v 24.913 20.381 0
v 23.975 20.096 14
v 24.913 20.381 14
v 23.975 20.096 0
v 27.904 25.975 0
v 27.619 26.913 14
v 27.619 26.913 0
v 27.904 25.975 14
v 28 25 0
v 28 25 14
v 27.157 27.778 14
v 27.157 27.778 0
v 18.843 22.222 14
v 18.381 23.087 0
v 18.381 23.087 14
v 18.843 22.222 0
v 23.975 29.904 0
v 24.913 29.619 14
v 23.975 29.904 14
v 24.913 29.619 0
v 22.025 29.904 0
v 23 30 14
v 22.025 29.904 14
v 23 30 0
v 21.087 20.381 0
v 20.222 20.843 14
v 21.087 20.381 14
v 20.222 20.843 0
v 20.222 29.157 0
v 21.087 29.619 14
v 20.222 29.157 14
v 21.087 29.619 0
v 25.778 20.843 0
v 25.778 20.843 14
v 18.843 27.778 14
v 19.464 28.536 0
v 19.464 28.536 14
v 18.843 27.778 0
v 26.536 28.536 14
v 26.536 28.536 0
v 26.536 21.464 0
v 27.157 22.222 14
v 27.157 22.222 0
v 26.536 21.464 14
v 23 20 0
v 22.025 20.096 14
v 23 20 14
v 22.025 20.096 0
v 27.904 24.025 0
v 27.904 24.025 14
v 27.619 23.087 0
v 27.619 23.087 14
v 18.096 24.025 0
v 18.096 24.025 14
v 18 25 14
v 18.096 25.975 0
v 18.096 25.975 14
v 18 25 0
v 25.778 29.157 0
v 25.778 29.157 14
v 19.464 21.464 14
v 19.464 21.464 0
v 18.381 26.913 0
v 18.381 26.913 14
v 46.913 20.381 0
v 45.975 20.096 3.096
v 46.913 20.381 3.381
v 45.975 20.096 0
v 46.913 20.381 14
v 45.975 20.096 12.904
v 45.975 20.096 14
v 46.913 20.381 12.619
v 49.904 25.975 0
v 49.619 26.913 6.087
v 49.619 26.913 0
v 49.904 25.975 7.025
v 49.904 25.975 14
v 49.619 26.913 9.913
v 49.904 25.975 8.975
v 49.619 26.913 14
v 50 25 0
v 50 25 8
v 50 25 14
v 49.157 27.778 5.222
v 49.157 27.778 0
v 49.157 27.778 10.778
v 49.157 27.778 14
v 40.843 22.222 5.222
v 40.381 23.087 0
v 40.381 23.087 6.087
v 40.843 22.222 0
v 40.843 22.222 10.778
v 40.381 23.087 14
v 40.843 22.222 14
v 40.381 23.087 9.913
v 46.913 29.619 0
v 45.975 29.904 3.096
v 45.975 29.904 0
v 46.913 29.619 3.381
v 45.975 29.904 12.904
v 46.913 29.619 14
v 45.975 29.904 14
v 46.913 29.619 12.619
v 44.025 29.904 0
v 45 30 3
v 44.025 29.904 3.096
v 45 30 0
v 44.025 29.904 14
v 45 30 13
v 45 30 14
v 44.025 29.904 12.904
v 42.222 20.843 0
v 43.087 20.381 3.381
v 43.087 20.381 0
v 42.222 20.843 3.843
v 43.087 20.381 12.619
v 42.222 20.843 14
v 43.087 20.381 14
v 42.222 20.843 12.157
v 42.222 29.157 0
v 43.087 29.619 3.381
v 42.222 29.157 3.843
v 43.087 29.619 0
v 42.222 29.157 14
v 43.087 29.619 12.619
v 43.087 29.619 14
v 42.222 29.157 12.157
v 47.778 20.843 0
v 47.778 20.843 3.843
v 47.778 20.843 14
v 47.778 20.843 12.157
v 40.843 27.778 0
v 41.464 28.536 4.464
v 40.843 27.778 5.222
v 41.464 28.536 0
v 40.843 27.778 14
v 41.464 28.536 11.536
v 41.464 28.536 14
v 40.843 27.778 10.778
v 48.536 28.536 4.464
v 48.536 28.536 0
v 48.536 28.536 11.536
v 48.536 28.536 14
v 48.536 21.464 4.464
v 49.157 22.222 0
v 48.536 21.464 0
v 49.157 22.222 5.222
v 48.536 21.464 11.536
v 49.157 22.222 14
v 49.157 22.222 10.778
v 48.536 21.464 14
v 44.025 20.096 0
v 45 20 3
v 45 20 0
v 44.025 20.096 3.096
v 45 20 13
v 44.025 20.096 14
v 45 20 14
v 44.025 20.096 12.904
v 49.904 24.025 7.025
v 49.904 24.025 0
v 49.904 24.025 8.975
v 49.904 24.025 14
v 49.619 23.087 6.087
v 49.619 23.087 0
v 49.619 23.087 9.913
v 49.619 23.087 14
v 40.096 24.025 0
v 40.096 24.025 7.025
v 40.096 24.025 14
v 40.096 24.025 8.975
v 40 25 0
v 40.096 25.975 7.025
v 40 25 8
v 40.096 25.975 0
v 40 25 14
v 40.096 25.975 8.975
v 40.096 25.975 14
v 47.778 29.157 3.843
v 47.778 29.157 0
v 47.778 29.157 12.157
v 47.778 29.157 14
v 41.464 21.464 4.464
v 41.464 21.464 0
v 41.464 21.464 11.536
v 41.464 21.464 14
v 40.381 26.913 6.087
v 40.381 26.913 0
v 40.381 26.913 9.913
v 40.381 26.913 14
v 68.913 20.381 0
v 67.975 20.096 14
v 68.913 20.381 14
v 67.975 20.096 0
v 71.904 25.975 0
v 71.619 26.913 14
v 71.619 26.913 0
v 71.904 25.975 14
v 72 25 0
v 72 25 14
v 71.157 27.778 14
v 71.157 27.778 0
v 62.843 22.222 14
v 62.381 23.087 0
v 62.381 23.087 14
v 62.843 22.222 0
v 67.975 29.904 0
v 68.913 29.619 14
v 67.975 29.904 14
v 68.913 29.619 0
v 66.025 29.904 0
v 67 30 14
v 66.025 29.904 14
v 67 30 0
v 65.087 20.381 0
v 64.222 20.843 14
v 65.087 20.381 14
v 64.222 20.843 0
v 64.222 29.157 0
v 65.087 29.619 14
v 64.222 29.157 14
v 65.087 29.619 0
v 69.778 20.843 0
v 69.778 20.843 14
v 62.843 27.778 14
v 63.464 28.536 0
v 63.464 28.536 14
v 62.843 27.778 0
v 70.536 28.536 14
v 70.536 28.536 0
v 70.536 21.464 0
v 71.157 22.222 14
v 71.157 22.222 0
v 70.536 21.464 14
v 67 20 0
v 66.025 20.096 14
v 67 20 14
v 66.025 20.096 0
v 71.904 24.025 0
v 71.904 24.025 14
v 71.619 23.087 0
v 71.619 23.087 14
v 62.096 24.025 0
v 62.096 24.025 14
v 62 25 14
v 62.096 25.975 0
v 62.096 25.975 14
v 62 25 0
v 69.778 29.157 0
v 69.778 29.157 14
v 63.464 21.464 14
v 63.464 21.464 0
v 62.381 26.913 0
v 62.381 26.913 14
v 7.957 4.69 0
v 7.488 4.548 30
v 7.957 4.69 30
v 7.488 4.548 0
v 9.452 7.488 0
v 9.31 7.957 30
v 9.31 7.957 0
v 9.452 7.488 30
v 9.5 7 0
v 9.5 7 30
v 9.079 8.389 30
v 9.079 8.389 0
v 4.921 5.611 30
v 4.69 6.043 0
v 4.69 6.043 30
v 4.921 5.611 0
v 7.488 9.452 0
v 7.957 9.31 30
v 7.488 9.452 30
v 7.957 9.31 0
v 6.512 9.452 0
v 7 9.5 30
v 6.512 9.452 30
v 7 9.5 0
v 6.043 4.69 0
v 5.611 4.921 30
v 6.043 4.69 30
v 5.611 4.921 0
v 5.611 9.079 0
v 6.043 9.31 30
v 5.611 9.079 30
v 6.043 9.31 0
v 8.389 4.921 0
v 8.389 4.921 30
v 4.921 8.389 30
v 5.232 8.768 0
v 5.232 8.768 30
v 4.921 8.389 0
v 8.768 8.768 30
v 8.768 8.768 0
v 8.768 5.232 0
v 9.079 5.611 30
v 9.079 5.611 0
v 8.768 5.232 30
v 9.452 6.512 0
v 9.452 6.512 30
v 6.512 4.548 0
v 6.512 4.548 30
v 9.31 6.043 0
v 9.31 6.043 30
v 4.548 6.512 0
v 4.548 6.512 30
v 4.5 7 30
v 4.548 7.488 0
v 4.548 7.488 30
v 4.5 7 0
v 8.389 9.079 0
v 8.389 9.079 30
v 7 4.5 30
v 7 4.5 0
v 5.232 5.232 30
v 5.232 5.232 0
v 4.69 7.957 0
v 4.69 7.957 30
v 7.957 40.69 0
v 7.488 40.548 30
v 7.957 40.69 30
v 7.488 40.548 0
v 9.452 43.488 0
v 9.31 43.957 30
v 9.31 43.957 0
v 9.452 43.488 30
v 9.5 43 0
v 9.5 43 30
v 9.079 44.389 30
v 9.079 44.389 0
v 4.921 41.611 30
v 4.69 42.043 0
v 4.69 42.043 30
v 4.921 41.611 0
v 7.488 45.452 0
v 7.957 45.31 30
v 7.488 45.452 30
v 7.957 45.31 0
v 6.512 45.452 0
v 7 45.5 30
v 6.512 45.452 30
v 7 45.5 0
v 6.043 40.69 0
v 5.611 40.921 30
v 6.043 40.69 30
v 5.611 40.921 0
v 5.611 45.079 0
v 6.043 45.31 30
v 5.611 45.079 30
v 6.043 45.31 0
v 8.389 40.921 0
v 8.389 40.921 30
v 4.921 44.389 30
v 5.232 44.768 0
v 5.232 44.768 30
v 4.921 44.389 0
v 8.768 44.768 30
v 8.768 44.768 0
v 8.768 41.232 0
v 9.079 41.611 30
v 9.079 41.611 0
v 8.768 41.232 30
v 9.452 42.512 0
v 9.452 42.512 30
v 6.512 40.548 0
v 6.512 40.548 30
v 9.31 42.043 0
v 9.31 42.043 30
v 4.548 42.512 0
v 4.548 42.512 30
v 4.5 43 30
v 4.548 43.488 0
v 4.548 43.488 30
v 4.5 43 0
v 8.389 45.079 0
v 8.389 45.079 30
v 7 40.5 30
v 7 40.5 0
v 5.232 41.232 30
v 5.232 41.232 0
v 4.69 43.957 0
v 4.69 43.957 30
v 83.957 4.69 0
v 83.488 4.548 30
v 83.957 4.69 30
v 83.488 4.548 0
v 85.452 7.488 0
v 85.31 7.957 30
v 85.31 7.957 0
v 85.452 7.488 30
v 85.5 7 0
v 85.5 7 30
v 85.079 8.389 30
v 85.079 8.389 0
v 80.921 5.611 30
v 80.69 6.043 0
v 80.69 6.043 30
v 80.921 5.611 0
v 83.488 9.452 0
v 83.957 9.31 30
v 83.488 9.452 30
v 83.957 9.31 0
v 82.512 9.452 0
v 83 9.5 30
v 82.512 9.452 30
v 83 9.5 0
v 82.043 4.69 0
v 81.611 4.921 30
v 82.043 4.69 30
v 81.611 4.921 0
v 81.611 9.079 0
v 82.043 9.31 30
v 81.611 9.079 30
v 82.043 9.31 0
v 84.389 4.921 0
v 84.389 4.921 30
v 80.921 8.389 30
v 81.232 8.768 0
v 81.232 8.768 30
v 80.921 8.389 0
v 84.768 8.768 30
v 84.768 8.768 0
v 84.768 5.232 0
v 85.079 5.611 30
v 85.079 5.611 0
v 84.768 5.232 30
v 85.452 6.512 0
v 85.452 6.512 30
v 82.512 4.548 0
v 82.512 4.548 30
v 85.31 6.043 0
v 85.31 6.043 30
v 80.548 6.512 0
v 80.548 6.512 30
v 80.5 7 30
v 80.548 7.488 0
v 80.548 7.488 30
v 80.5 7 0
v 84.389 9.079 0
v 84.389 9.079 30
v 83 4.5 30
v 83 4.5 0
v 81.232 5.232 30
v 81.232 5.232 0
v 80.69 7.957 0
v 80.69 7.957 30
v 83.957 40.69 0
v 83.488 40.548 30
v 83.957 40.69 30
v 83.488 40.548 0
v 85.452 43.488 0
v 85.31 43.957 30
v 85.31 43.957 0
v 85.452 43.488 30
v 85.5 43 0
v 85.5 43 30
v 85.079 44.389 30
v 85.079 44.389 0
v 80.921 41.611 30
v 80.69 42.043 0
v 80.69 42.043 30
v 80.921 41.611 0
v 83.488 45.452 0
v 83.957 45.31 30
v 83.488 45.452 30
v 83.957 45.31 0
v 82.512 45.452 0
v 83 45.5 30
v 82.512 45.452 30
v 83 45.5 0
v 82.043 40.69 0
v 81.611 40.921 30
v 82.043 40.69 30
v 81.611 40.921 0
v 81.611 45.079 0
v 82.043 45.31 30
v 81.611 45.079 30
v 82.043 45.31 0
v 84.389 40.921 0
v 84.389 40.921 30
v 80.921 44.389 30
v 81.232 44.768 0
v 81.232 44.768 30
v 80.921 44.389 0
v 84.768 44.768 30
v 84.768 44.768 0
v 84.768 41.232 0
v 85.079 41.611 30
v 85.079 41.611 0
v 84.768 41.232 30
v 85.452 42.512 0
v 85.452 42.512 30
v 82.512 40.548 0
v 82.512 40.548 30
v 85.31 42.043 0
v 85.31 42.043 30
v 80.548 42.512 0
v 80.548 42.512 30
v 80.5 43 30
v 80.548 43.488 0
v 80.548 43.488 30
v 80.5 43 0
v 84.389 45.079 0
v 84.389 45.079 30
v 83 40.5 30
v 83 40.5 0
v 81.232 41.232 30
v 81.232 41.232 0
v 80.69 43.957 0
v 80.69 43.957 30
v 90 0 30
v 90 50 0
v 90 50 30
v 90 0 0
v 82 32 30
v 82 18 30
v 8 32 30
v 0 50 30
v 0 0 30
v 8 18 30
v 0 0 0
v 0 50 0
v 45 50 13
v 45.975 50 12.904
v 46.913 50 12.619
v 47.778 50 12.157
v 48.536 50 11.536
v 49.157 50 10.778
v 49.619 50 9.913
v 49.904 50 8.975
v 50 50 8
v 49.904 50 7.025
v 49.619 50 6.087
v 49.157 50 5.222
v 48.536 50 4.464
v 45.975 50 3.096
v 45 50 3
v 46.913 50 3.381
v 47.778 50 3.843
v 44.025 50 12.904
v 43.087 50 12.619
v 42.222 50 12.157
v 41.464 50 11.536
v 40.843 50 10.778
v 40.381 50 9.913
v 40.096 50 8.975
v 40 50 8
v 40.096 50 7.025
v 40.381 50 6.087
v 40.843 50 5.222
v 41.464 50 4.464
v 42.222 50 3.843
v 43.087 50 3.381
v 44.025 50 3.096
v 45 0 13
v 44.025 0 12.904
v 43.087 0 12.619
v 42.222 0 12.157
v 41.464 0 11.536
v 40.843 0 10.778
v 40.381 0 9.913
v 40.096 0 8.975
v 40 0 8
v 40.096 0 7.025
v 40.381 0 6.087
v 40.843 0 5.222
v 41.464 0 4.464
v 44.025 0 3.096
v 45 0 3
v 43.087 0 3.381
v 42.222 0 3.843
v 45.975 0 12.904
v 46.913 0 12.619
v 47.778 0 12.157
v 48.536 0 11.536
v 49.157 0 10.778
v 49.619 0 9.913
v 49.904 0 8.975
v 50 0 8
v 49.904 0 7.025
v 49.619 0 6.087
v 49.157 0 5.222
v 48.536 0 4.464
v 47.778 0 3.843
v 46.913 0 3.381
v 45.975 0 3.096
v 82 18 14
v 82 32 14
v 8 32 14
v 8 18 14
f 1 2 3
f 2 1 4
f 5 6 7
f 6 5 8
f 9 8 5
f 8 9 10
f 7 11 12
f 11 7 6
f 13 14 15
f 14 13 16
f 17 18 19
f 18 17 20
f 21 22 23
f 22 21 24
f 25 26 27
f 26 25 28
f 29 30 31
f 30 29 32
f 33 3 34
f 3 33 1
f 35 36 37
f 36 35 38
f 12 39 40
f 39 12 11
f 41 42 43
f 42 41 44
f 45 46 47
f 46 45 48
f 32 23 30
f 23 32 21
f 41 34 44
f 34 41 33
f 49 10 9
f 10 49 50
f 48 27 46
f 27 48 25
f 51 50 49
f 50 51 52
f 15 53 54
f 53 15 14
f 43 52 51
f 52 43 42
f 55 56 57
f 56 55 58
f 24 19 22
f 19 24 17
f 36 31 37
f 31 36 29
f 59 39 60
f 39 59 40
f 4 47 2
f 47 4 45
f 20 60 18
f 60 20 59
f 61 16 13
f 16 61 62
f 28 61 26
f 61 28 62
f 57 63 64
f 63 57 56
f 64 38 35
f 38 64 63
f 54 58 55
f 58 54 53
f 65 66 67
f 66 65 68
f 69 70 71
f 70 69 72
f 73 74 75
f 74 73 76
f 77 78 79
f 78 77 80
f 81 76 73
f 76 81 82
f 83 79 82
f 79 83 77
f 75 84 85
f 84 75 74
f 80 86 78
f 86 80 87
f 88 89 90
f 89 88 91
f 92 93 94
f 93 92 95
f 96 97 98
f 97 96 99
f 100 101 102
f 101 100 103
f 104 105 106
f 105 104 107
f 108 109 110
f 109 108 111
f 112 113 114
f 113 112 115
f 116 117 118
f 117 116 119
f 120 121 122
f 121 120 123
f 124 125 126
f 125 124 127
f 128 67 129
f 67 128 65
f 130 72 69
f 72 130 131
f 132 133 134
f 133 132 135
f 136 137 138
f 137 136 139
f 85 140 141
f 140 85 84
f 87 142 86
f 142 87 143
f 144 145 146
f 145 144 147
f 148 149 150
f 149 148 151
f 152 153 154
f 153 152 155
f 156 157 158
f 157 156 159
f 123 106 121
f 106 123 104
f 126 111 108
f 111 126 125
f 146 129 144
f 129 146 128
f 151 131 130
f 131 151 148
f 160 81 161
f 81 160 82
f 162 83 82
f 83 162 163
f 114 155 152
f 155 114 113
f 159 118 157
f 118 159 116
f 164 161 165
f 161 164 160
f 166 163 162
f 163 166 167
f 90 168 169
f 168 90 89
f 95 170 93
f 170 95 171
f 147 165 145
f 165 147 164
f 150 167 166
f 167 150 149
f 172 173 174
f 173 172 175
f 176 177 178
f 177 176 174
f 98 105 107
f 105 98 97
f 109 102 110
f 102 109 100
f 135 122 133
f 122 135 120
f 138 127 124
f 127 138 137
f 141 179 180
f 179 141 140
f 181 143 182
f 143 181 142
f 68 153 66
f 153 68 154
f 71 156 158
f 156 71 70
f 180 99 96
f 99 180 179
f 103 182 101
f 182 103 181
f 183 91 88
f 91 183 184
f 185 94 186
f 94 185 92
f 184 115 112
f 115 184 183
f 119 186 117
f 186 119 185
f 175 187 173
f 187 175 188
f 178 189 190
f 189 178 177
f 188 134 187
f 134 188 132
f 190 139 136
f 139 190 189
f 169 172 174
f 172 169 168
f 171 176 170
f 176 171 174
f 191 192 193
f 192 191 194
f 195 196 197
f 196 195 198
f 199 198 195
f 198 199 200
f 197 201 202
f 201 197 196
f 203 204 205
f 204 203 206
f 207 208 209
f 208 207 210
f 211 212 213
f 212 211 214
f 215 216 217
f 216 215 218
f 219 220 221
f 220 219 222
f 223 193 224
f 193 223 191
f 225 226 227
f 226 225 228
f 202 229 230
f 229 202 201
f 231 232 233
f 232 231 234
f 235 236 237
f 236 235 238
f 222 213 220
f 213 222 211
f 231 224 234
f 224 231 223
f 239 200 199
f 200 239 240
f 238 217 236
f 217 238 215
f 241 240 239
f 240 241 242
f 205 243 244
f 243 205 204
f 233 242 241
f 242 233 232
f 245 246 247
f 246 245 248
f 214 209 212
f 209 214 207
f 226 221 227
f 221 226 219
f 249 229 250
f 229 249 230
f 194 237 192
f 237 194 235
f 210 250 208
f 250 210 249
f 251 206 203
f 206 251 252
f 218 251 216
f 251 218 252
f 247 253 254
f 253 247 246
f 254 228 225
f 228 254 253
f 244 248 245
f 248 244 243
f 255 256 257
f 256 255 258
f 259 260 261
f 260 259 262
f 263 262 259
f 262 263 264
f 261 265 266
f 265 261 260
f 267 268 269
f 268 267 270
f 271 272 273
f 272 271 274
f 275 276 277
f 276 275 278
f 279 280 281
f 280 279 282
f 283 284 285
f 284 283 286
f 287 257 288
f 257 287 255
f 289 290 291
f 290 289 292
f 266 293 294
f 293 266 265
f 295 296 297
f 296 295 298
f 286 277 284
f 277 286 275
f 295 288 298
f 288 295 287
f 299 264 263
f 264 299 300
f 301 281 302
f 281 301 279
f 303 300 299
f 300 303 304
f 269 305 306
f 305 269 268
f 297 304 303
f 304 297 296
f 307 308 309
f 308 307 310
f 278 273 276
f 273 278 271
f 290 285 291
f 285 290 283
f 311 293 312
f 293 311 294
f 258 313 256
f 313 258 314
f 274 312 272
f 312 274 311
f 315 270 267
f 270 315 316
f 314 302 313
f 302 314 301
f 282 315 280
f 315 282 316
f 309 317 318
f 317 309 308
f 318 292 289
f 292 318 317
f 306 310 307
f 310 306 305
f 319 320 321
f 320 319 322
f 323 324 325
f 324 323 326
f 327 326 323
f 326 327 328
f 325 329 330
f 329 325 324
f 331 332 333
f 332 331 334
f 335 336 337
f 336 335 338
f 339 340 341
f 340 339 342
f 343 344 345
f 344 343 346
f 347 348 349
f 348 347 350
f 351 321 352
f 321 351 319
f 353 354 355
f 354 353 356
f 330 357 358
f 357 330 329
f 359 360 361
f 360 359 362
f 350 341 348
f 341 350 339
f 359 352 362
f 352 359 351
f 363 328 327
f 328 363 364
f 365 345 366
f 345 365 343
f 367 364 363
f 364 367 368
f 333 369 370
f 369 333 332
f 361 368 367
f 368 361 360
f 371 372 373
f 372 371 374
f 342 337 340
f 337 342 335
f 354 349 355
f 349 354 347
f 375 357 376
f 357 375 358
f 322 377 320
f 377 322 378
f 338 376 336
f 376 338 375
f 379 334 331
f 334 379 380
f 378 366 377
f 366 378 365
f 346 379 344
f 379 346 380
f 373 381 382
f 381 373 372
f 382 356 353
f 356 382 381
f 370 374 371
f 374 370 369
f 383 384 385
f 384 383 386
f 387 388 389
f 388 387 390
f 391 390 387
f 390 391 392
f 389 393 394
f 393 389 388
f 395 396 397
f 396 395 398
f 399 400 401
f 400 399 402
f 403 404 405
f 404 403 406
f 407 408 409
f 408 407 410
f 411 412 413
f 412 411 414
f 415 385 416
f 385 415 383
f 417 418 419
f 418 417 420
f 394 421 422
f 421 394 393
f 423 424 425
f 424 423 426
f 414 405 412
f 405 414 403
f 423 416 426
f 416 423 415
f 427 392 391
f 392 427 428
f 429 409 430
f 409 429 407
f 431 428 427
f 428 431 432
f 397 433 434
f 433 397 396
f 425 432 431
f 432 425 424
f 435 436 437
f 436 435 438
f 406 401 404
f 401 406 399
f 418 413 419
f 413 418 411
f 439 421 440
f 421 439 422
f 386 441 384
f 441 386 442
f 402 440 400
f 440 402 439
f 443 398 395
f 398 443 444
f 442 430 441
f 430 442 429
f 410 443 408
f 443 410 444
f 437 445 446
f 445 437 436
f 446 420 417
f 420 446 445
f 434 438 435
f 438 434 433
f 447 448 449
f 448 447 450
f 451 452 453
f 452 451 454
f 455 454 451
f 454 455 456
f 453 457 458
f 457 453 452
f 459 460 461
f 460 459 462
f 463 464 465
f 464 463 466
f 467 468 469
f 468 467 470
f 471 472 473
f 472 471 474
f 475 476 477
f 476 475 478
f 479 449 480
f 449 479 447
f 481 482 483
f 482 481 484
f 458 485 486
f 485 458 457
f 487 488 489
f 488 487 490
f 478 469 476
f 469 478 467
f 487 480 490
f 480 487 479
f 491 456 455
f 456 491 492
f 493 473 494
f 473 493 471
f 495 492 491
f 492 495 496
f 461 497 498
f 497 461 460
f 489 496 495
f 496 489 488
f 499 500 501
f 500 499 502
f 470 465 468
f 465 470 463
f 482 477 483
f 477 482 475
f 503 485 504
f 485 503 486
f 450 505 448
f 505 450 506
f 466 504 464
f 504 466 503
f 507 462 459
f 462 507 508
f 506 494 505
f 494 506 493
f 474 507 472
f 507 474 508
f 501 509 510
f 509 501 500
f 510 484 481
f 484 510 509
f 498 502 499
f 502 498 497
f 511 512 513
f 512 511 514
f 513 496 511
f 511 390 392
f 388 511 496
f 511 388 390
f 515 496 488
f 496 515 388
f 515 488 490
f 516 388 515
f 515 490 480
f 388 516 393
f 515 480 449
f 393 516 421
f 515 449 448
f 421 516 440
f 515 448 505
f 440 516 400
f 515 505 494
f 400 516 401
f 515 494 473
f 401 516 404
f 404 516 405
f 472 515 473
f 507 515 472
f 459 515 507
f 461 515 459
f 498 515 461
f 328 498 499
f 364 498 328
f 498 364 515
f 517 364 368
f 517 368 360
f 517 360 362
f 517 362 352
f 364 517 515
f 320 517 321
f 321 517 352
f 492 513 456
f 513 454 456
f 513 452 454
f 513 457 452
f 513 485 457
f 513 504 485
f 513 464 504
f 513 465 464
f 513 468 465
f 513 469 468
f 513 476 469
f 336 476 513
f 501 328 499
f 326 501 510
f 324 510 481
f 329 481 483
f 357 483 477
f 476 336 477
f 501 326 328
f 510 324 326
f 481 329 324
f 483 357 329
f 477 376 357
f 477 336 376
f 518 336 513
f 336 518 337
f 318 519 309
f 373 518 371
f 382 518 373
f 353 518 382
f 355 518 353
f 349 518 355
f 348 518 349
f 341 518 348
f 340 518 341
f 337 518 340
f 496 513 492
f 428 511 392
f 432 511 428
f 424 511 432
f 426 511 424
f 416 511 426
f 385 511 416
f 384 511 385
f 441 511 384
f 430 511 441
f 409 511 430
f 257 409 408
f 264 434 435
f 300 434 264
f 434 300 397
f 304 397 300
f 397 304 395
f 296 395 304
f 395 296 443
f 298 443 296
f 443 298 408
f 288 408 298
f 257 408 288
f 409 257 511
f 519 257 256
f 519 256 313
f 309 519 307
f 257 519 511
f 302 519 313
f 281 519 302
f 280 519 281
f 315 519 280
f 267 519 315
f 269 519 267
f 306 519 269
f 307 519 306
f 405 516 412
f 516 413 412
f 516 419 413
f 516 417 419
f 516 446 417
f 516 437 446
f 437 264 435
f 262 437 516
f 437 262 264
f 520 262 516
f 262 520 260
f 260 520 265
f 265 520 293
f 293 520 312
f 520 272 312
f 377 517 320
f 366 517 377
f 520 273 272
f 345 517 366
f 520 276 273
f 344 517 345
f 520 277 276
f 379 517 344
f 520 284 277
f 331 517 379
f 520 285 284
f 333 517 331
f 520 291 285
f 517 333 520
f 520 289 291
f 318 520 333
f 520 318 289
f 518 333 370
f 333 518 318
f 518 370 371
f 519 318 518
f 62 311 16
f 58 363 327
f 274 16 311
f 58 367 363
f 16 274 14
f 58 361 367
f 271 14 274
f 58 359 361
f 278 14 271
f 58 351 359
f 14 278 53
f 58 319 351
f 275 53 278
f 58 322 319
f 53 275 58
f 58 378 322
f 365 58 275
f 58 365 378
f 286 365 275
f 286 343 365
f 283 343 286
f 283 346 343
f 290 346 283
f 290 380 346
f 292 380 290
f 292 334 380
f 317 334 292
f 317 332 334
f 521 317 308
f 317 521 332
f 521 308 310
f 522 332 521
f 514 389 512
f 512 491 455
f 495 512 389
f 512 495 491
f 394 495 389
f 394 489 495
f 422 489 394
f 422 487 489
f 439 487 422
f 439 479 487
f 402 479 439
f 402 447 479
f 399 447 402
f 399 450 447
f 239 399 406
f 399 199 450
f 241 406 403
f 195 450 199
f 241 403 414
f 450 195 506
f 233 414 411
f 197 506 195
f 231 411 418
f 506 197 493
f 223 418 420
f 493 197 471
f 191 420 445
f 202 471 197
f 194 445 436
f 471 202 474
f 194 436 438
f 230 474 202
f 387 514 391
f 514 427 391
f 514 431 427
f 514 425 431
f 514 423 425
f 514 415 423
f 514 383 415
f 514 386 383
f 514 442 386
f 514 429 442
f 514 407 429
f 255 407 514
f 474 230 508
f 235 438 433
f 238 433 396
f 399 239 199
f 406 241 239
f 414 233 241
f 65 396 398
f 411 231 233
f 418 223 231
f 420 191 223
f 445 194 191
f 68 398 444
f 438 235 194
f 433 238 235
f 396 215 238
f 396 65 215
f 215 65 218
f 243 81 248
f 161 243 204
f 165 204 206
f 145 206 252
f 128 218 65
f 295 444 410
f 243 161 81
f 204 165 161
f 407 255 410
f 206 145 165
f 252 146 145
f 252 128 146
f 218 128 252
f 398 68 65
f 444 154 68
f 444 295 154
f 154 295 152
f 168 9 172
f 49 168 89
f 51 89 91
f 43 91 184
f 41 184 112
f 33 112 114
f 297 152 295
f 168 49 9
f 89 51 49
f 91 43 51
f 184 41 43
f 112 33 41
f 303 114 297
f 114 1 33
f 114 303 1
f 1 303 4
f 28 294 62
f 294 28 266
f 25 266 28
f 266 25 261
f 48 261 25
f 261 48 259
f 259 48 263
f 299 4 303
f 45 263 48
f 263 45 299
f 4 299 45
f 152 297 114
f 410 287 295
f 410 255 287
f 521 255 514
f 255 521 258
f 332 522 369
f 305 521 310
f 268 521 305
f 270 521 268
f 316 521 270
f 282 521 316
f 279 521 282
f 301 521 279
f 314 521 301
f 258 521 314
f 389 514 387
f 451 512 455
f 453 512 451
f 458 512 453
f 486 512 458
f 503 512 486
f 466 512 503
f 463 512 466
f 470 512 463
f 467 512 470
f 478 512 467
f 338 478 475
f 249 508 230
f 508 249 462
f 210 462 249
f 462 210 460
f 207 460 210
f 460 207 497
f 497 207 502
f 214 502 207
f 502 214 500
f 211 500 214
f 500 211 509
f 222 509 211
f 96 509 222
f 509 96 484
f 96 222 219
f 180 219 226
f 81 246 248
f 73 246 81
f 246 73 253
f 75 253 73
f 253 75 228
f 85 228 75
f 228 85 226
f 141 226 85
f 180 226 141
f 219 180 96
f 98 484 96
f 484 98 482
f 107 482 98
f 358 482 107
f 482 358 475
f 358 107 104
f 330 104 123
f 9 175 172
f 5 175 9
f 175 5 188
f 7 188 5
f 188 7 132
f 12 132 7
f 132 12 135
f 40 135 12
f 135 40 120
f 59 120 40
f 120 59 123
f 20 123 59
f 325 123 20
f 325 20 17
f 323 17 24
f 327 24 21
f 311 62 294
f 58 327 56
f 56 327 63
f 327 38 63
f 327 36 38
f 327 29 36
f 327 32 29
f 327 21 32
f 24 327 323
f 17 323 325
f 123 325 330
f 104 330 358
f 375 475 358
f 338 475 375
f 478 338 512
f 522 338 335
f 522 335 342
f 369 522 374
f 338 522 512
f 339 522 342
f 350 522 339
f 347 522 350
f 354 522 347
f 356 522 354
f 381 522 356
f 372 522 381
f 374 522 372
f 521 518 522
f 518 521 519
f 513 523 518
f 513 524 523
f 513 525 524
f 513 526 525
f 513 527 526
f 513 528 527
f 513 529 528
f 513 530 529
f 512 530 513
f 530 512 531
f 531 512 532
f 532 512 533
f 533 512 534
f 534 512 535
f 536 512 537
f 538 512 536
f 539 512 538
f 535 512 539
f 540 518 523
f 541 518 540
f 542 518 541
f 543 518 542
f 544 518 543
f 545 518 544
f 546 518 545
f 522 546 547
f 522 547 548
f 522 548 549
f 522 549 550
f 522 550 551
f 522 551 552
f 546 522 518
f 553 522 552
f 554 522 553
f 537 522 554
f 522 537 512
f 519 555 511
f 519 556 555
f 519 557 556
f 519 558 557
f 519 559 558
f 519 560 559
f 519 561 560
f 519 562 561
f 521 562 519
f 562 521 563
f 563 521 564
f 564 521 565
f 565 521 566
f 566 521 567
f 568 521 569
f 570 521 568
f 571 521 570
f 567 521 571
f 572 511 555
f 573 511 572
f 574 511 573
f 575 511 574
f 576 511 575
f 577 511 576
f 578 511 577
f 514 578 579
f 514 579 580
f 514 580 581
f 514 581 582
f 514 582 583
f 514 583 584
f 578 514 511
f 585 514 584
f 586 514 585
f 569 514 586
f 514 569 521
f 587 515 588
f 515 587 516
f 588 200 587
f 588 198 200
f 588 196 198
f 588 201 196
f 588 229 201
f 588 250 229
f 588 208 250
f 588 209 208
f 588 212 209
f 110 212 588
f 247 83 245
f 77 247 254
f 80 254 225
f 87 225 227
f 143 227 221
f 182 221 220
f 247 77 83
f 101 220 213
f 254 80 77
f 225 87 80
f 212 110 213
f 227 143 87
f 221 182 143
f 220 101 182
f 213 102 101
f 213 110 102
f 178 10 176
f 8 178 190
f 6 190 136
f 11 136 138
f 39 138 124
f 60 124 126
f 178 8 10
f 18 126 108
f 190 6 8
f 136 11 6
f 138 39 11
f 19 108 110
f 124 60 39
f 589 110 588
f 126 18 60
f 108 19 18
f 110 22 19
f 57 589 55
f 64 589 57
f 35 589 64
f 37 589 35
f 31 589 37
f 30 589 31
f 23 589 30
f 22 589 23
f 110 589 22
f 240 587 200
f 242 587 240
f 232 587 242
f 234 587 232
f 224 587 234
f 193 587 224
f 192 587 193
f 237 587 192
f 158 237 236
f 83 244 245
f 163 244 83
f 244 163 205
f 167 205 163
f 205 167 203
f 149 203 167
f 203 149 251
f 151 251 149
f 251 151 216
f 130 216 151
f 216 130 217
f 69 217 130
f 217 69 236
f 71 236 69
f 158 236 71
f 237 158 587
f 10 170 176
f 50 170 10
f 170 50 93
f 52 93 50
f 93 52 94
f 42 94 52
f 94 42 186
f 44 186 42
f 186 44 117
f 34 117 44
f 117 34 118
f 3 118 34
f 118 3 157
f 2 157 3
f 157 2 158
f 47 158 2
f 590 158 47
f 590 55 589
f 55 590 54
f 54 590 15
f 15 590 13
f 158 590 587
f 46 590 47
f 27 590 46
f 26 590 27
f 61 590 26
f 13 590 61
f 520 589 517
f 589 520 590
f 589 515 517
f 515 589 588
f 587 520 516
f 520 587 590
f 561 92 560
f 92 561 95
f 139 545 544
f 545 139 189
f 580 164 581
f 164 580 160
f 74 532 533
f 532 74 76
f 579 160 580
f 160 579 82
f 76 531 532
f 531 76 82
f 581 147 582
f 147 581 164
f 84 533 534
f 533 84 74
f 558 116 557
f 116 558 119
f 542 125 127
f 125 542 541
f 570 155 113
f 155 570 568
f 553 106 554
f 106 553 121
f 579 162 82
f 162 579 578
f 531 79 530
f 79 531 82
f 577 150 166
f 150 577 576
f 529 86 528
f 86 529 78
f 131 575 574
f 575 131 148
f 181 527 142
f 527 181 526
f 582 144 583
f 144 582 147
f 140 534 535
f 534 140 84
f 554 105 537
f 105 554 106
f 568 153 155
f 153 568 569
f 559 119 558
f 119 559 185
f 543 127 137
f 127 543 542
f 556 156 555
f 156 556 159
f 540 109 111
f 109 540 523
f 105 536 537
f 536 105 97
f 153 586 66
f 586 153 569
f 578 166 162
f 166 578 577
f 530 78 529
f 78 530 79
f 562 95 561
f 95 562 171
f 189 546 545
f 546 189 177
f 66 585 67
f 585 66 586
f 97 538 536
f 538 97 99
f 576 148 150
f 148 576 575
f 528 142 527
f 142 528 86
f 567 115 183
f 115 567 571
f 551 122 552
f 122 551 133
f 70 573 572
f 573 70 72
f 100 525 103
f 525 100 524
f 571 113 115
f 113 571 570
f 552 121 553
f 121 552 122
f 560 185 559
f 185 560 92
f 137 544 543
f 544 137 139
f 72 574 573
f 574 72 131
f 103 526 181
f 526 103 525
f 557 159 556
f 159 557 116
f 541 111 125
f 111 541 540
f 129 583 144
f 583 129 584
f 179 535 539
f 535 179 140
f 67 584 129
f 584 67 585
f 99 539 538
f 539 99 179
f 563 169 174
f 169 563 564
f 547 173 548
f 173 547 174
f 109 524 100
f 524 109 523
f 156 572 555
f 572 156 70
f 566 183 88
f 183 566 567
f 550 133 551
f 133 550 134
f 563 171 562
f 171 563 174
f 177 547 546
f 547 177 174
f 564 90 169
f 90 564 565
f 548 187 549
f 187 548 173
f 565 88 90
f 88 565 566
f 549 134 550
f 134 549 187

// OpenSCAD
$fn = 32;

// ----------------------------------------------------------------------
// Manifold block: side_outlet manifold
// ----------------------------------------------------------------------

// --- parameters (mm) ---
block_l = 90;             // block length, X
block_w = 50;             // block width, Y
block_h = 30;             // block height, Z
port_d = 10;              // port bore diameter
port_pitch = 22;          // port pitch along X
gallery_d = 14;           // top gallery width, Y
gallery_depth = 16;       // gallery pocket depth
wall_p = 8;               // gallery end wall thickness, X
mnt_d = 5;                // mounting hole diameter
mnt_in = 7;               // mounting hole inset from the edges
out_d = 10;               // outlet bore diameter
out_z = 8;                // outlet axis height

n_ports = 3;  // ports in the row
port_x0 = (block_l - (n_ports - 1) * port_pitch) / 2;  // first port X

difference() {
  cube([block_l, block_w, block_h]);
  for (i = [0 : n_ports - 1])
    translate([port_x0 + i * port_pitch, block_w / 2, -1])
      cylinder(h = block_h + 2, d = port_d);
  translate([wall_p, block_w / 2 - gallery_d / 2, block_h - gallery_depth])
    cube([block_l - 2 * wall_p, gallery_d, gallery_depth + 1]);
  for (cx = [mnt_in, block_l - mnt_in])
    for (cy = [mnt_in, block_w - mnt_in])
      translate([cx, cy, -1]) cylinder(h = block_h + 2, d = mnt_d);
  translate([block_l / 2, -1, out_z]) rotate([-90, 0, 0])
    cylinder(h = block_w + 2, d = out_d);
}
